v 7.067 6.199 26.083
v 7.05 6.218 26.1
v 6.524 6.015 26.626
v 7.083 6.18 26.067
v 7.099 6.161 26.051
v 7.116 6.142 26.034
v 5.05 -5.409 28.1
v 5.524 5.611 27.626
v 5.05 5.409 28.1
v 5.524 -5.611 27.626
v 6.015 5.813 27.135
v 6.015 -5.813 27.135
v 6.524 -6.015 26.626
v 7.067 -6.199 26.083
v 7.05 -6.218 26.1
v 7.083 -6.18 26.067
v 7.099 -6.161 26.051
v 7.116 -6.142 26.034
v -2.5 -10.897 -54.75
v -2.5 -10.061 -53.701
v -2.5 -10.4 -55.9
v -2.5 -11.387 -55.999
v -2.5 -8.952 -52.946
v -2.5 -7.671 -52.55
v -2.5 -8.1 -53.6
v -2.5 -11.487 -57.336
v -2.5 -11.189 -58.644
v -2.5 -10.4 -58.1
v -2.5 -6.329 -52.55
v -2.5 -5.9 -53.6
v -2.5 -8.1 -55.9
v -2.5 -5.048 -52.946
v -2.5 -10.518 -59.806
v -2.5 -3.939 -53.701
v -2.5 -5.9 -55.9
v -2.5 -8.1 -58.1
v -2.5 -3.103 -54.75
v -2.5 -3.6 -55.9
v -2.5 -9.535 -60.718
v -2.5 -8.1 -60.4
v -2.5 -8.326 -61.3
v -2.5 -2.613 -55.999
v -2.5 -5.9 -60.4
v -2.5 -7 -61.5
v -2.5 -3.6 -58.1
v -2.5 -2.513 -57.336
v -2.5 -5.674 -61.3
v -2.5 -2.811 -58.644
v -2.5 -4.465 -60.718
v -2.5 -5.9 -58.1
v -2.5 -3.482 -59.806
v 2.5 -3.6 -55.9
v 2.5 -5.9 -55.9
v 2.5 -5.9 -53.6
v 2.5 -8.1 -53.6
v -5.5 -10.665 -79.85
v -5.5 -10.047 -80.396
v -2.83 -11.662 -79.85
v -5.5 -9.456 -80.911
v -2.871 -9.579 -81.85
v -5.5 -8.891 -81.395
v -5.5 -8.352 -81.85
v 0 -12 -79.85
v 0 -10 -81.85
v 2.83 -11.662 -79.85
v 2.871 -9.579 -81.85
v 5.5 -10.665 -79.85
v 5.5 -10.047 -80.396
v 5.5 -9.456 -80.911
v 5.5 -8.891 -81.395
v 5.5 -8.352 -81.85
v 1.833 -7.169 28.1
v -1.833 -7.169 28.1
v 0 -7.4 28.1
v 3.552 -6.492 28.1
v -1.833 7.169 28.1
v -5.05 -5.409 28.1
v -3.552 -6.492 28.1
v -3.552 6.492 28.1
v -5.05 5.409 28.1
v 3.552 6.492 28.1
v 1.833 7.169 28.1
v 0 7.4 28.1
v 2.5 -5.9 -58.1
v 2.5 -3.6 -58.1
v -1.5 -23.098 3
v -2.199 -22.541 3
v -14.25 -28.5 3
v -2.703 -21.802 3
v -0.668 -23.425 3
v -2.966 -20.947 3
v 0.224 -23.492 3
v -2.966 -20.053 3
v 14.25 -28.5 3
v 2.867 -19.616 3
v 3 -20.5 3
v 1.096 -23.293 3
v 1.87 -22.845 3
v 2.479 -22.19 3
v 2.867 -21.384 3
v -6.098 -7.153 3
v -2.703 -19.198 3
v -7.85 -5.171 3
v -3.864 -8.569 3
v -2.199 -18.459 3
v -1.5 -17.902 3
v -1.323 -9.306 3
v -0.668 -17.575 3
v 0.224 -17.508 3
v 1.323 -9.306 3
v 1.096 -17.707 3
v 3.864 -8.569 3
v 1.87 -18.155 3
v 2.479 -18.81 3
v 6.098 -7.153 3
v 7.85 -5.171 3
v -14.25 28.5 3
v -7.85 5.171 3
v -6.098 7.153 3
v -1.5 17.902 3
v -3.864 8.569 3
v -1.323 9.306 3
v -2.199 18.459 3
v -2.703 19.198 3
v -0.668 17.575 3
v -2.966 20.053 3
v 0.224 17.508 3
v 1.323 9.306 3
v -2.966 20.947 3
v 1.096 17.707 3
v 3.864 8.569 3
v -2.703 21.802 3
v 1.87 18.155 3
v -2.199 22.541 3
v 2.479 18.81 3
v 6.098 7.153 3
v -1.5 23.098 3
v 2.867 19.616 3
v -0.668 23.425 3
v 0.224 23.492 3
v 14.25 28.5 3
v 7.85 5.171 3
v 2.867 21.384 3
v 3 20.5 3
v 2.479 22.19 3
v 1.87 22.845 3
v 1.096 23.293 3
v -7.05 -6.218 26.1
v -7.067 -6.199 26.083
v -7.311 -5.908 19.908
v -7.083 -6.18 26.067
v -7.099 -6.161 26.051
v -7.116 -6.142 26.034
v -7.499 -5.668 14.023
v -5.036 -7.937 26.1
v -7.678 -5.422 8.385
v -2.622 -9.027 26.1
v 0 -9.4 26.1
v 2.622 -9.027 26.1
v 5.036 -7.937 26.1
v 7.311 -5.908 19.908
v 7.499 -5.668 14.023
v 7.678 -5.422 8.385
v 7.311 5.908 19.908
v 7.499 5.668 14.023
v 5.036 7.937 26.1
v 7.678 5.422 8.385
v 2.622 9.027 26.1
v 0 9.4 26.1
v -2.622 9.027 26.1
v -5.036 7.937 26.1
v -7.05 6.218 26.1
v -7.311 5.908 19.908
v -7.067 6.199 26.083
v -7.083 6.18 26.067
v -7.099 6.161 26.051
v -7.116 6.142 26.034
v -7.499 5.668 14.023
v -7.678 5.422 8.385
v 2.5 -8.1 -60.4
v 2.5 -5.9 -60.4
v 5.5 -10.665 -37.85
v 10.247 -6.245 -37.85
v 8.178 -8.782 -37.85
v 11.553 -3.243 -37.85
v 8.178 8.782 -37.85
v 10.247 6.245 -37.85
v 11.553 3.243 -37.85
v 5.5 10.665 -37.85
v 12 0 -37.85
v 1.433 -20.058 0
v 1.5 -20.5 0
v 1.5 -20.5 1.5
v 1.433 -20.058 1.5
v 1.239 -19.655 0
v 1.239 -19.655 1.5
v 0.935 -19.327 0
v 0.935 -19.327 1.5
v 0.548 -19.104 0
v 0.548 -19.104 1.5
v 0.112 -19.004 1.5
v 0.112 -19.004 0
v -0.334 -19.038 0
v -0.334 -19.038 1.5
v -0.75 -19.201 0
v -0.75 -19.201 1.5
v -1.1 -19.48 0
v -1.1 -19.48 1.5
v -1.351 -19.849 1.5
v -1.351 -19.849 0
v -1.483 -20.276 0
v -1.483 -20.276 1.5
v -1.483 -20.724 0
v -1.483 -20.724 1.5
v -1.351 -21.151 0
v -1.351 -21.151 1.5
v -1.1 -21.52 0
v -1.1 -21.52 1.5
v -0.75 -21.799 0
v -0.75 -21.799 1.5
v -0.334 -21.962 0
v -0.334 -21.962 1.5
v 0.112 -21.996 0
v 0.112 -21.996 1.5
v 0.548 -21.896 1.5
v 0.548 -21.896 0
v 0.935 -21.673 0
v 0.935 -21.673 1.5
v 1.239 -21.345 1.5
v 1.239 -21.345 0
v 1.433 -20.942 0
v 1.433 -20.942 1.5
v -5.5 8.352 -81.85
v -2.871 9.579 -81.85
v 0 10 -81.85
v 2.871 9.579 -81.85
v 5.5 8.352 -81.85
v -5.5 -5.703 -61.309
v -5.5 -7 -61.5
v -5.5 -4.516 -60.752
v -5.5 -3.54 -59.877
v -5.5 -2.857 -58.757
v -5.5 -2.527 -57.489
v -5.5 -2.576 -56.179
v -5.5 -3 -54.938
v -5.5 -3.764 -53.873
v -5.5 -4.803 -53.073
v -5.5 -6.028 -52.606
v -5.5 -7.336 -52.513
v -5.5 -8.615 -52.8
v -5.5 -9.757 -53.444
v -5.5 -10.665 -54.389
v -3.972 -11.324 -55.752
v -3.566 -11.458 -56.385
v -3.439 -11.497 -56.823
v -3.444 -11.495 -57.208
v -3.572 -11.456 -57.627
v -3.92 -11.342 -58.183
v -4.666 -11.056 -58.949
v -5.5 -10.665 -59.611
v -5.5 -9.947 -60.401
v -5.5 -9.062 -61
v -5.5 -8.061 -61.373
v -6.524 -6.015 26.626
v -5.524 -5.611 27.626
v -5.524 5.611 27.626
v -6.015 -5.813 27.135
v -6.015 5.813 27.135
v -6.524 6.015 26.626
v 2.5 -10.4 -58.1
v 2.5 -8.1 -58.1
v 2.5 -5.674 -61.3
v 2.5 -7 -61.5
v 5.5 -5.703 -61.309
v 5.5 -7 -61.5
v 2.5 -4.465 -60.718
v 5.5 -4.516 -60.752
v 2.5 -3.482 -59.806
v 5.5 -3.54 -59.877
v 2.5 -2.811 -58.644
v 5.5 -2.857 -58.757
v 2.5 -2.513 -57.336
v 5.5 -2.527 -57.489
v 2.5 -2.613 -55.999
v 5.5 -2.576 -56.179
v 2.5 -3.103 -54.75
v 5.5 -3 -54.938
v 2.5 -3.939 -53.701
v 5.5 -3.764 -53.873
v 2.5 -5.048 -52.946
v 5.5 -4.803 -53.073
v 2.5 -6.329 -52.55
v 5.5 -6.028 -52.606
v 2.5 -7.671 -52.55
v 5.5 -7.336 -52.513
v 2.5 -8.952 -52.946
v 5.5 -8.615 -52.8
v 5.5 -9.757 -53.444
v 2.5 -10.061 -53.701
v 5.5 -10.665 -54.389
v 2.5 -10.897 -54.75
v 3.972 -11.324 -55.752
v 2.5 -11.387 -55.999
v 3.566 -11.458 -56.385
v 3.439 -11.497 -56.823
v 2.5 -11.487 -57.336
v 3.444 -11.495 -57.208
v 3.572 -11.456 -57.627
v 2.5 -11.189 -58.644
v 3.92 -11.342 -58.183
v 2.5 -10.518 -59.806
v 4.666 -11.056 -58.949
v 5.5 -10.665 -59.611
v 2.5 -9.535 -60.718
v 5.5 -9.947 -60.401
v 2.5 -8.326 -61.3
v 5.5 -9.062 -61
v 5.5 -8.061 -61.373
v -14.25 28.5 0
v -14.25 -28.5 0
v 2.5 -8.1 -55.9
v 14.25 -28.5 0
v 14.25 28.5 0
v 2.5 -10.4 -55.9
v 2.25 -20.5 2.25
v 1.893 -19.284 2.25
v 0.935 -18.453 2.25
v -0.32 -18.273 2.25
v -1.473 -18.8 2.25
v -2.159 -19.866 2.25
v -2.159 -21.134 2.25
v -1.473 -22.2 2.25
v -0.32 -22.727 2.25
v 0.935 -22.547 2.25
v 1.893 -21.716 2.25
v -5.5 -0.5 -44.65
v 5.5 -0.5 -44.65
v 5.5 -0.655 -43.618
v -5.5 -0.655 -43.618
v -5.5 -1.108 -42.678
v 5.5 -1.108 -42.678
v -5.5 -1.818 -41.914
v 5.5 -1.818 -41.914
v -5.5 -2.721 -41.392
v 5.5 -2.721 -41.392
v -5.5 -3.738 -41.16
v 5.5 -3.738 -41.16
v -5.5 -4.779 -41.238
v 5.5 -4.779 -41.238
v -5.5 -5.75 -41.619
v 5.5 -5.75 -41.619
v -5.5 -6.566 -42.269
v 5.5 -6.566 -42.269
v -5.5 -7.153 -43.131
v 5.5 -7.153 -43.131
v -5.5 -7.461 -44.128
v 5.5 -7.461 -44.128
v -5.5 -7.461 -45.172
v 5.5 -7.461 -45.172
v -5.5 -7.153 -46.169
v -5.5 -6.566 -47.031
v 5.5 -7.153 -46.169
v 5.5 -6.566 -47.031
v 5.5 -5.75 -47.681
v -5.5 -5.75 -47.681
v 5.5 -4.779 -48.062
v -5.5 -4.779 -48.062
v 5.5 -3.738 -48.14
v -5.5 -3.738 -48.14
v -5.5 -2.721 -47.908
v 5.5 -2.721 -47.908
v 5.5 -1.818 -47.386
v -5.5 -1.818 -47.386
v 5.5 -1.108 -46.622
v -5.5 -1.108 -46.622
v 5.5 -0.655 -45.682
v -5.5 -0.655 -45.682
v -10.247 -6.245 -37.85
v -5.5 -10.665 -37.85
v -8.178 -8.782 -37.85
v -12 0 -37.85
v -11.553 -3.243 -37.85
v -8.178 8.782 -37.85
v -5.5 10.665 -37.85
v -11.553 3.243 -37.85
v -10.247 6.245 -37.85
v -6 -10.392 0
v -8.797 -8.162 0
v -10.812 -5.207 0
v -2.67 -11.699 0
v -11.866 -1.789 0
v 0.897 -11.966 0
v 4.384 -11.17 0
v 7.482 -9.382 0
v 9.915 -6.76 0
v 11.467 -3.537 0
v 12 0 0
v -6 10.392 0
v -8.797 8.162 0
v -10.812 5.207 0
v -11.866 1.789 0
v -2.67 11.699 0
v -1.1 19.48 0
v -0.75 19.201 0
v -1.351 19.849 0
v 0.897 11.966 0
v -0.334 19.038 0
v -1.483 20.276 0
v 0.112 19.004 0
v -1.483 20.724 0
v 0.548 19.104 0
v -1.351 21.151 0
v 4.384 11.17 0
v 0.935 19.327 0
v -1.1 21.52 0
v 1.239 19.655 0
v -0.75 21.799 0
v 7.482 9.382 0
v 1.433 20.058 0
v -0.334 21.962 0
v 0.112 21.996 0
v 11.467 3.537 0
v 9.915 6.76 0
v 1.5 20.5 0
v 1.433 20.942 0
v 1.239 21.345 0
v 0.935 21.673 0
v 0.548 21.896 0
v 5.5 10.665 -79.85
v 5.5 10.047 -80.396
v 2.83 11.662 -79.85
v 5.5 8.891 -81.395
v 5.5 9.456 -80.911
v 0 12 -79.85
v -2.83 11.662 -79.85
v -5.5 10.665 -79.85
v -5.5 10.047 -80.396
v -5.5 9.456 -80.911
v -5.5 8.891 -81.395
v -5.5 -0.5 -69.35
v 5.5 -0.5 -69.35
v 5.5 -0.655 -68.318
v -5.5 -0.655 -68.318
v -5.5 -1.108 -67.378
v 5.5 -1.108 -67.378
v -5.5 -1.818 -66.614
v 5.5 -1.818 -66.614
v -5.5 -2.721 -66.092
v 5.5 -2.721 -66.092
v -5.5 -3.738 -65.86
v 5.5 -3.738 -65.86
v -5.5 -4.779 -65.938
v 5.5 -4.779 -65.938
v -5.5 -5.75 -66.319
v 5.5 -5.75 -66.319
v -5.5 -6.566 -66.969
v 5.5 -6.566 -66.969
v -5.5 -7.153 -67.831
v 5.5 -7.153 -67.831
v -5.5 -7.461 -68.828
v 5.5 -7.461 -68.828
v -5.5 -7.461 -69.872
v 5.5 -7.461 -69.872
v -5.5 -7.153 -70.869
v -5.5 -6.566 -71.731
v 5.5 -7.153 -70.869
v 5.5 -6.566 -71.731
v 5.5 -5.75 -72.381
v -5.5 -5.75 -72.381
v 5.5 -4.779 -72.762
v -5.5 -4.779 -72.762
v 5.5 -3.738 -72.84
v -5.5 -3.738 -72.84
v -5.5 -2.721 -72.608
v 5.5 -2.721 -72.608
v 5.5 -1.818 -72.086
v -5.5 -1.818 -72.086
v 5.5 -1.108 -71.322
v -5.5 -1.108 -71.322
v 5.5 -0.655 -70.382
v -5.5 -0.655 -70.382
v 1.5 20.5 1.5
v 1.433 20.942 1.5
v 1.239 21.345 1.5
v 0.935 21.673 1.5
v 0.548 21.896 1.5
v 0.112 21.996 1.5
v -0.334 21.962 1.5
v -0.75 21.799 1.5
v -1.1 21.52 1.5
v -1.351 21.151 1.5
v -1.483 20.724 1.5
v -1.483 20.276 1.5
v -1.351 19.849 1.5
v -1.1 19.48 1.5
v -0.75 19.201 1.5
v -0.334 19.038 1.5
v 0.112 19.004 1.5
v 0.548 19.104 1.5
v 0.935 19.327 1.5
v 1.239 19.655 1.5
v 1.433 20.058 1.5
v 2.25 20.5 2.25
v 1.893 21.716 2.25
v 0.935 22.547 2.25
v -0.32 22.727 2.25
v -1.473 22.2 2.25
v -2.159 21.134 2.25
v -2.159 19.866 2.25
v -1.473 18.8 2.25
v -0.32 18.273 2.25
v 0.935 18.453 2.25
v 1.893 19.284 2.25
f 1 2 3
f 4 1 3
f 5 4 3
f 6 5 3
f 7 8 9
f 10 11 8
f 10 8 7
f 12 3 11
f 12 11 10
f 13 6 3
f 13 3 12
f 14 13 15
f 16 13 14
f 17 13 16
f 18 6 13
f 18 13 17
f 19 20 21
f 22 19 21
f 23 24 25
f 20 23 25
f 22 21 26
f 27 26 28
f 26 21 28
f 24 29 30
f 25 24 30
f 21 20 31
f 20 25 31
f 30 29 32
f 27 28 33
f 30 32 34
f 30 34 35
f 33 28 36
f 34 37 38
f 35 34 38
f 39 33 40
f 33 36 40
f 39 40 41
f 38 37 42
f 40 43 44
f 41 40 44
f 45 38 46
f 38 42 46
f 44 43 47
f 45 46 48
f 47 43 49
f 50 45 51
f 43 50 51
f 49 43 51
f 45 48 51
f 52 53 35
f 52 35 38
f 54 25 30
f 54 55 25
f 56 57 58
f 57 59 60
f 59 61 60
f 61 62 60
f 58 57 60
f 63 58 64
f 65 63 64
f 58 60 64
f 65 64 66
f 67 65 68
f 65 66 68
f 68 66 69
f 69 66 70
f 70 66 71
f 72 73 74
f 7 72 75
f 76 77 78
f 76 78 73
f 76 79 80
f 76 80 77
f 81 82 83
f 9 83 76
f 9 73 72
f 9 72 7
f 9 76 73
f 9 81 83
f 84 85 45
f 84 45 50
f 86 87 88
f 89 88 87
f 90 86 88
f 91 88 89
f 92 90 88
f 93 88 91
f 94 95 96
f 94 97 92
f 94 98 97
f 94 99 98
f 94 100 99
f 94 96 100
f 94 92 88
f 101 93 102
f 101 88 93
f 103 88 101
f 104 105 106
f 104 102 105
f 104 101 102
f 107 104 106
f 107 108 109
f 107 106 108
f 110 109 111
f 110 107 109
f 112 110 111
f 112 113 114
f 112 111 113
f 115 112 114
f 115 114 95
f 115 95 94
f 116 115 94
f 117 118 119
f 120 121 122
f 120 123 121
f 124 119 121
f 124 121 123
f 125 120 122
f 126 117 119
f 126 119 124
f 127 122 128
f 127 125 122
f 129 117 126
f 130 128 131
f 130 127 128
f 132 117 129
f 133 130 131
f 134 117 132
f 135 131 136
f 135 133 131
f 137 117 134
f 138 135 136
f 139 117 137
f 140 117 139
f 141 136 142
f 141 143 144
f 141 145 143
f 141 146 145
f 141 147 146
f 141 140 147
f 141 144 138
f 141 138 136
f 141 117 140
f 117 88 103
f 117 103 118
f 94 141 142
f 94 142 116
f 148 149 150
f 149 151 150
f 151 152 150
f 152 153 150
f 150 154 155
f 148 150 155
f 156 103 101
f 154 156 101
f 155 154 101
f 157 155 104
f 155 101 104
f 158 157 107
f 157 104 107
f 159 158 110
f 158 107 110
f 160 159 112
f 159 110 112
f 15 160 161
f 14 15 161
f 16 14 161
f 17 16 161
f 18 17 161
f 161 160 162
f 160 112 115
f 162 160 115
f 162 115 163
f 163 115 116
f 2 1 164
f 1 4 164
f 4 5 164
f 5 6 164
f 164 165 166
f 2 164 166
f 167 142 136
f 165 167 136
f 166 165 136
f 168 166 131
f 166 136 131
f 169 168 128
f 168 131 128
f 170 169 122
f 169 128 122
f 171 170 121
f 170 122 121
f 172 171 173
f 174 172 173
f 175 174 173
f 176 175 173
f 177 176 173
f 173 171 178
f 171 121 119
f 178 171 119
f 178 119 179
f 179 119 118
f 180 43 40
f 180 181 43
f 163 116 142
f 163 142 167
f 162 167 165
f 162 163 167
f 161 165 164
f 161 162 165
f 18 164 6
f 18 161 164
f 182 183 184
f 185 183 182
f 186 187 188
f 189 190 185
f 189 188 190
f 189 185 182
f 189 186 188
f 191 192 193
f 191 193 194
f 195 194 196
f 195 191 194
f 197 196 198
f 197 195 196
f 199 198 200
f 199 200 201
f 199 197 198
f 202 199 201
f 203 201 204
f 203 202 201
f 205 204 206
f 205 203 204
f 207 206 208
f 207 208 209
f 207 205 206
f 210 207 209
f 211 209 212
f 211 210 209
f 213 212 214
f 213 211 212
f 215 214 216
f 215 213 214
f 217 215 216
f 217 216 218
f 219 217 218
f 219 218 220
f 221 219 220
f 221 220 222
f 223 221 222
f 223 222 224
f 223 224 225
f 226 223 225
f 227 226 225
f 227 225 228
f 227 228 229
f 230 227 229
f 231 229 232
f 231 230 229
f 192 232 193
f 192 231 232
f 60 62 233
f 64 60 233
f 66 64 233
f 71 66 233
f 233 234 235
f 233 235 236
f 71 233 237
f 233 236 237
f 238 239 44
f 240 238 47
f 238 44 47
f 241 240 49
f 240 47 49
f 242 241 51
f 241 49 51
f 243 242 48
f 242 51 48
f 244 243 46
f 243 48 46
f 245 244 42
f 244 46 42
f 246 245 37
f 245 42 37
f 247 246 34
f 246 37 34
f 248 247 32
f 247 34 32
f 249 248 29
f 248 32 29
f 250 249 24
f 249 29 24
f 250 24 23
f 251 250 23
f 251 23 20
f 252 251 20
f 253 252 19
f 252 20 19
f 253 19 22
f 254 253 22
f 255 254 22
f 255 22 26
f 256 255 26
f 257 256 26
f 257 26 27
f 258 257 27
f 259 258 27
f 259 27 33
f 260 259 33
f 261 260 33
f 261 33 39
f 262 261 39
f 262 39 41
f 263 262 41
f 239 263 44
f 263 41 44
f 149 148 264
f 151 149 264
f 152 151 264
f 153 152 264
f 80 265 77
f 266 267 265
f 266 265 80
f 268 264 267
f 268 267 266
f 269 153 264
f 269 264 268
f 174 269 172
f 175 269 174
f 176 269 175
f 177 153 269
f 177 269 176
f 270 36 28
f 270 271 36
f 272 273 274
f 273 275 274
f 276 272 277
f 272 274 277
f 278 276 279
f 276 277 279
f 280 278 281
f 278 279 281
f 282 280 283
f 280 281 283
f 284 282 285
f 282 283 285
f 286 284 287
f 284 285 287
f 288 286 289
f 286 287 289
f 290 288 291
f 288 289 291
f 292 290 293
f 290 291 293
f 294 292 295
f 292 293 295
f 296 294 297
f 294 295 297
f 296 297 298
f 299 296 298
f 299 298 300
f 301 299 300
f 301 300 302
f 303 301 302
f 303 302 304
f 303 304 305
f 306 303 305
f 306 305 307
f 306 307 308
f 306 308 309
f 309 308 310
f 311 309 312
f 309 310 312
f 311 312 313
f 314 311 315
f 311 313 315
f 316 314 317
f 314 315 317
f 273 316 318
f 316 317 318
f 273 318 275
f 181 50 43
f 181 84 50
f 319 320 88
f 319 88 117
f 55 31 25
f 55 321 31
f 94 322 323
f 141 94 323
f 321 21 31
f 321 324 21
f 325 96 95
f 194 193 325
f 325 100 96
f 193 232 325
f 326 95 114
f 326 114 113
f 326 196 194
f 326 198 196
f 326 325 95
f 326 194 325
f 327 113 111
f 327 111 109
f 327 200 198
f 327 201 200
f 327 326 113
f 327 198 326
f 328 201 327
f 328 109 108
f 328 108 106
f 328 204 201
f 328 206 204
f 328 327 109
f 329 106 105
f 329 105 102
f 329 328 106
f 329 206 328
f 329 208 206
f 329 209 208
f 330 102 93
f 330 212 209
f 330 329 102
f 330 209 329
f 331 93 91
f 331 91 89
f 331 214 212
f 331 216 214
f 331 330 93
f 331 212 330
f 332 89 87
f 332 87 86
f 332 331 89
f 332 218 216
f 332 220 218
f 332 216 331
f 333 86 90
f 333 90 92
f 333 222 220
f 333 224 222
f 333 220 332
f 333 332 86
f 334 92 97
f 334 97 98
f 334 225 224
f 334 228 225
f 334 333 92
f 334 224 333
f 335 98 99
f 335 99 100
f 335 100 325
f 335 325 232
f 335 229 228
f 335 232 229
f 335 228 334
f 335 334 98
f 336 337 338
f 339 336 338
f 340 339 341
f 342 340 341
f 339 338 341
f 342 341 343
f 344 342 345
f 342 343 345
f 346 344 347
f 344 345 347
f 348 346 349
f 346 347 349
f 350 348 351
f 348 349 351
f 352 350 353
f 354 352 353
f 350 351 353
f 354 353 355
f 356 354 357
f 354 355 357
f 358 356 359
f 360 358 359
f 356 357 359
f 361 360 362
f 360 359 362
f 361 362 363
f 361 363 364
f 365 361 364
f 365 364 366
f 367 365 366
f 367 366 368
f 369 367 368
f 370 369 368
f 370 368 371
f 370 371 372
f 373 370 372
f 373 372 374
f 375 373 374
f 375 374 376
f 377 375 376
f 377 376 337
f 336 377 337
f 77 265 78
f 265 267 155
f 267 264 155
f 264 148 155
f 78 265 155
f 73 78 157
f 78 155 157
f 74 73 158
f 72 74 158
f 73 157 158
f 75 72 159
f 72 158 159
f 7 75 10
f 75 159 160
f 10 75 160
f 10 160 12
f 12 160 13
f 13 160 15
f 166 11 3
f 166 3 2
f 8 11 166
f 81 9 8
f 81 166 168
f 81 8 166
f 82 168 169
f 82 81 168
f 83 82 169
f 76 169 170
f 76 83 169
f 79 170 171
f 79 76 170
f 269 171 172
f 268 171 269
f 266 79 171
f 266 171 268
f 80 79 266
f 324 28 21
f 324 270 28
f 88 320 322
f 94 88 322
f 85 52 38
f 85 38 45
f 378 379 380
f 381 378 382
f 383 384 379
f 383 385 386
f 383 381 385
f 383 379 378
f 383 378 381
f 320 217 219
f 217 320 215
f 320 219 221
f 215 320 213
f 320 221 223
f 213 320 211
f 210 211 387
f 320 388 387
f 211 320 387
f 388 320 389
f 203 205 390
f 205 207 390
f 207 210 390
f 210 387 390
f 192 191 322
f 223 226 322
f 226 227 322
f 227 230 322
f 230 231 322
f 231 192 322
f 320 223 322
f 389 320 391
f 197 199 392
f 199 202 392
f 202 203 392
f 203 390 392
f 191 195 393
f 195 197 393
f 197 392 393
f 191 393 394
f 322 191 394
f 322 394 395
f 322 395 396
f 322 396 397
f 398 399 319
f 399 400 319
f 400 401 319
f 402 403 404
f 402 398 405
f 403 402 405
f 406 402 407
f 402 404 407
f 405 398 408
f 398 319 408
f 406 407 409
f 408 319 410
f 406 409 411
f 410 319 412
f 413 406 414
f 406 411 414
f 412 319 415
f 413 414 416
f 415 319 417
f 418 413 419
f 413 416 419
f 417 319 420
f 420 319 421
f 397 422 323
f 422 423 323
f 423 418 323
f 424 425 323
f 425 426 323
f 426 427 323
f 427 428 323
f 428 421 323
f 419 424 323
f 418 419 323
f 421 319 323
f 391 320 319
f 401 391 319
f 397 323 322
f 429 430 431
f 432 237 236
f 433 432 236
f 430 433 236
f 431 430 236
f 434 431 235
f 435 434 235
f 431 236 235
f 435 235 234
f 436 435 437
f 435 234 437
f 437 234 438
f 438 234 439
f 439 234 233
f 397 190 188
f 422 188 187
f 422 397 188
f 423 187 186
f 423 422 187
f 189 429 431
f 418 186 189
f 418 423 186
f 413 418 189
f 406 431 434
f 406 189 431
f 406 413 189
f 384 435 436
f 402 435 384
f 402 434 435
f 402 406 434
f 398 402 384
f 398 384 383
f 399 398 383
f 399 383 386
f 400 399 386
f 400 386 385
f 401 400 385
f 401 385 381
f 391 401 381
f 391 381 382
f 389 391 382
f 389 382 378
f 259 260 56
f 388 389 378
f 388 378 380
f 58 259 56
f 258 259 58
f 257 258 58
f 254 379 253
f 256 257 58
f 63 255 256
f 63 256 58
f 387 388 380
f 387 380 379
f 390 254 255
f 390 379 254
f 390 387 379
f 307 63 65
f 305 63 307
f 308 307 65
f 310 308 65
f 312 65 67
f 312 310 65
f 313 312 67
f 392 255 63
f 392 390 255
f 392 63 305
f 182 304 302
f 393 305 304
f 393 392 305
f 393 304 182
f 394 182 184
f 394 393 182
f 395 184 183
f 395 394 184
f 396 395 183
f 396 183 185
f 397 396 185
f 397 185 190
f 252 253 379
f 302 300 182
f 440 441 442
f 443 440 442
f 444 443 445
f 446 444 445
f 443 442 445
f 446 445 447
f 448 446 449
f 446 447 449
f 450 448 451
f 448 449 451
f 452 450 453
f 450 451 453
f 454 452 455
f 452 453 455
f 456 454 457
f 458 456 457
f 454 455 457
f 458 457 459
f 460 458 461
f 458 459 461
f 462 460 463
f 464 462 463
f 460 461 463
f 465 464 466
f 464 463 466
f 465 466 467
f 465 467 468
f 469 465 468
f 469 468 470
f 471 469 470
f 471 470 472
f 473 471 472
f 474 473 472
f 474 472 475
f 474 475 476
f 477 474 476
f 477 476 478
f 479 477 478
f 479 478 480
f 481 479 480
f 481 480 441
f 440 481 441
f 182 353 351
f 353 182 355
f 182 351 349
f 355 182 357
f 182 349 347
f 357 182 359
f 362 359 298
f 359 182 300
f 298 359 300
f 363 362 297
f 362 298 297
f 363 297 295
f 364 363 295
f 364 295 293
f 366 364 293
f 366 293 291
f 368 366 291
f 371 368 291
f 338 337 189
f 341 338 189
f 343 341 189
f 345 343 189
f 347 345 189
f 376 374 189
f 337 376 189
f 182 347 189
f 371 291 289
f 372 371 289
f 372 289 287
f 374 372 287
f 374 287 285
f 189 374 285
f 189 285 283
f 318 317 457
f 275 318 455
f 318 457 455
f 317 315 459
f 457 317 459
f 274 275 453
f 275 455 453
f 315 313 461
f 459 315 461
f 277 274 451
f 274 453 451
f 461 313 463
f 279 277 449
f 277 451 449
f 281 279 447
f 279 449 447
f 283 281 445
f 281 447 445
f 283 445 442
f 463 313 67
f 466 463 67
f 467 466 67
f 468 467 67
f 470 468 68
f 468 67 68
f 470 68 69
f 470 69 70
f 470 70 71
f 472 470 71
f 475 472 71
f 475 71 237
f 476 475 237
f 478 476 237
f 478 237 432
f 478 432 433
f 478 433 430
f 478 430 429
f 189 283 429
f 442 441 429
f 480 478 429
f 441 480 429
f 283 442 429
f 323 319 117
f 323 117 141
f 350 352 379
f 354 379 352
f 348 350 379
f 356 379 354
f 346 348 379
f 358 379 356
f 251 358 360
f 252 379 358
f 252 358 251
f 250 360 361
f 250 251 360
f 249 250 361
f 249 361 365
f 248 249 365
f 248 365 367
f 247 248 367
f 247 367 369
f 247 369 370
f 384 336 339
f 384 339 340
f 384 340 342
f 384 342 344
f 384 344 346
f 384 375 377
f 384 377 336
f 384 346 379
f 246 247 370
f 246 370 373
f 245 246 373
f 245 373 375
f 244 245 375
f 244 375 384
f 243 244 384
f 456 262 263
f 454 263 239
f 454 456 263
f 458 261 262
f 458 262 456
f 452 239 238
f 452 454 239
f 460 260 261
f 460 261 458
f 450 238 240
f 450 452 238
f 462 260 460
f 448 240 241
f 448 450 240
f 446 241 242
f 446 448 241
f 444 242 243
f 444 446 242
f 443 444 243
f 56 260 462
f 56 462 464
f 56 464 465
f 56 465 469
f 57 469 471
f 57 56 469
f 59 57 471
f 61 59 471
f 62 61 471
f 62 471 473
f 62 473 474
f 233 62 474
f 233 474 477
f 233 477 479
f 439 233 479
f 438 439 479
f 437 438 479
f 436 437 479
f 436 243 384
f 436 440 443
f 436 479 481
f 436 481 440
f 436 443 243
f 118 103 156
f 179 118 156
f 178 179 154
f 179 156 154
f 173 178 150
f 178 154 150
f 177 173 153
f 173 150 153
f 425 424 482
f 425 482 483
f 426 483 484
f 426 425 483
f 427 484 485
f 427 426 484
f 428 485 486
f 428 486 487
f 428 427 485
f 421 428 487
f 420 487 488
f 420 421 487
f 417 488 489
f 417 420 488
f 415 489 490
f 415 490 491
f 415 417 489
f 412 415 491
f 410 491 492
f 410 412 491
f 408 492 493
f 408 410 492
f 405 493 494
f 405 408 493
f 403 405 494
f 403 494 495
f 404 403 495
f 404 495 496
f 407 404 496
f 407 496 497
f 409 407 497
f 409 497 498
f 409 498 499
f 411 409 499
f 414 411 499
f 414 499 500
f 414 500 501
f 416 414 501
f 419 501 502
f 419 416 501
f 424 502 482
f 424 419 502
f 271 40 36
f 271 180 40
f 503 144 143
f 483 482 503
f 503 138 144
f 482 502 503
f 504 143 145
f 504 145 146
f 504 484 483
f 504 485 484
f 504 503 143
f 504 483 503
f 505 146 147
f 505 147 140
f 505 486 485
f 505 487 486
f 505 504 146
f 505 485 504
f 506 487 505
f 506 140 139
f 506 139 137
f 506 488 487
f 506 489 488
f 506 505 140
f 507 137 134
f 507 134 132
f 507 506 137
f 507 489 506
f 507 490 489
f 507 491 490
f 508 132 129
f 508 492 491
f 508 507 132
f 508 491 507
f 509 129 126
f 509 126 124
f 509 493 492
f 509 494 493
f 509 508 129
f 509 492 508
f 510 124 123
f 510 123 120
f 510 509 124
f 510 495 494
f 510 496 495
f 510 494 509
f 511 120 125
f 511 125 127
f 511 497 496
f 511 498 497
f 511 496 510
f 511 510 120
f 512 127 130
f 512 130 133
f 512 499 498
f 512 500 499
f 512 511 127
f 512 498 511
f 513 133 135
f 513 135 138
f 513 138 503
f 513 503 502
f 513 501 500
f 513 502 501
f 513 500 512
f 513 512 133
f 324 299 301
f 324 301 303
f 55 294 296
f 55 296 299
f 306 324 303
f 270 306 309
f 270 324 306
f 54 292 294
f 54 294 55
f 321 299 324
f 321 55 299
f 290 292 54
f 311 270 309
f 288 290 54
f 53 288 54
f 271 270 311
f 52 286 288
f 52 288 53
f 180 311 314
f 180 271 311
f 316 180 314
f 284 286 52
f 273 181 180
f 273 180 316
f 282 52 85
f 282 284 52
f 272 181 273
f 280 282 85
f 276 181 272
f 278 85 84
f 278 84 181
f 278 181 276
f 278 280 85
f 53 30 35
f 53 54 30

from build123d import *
from OCP.BRepFilletAPI import BRepFilletAPI_MakeChamfer

# Parameters (mm, degrees)
SKETCH2_R                = 12
BOSS_EXTRUDE1_DEPTH      = 81.85
SKETCH3_W                = 28.5
SKETCH3_H                = 57
SKETCH3_R                = 1.5
BOSS_EXTRUDE2_DEPTH      = 3
CHAMFER1_SIZE            = 1.5
SKETCH4_R                = 9.4
BOSS_EXTRUDE3_DEPTH      = 25.1
CUT_EXTRUDE1_DEPTH       = 88.8335642
CUT_EXTRUDE1_DEPTH_BACK  = 88.8335642
CHAMFER2_SIZE            = 2
CHAMFER2_SIZE2           = 2.066892656
CHAMFER3_SIZE            = 2
SKETCH6_R                = 4.5
CUT_EXTRUDE2_DEPTH       = 88.8335642
CUT_EXTRUDE2_DEPTH_BACK  = 88.8335642
SKETCH7_W                = 35.652875986
SKETCH7_H                = 43.298184849
SKETCH7_W_2              = 11
SKETCH7_H_2              = 30
CUT_EXTRUDE3_DEPTH       = 44
SKETCH8_R                = 4.5
BOSS_EXTRUDE4_DEPTH      = 2.5
BOSS_EXTRUDE4_DEPTH_BACK = 2.5
SKETCH9_R                = 3.5
CUT_EXTRUDE4_DEPTH       = 89.891703775


with BuildPart() as part:
    # Sketch2 → Boss-Extrude1 (new body)
    with BuildSketch(Plane.XY):
        Circle(SKETCH2_R)
    extrude(amount=-BOSS_EXTRUDE1_DEPTH)

    # Sketch3 → Boss-Extrude2 (add)
    with BuildSketch(Plane.XY):
        Rectangle(SKETCH3_W, SKETCH3_H)
        with Locations((0, 20.5)):
            Circle(SKETCH3_R, mode=Mode.SUBTRACT)
        with Locations((0, -20.5)):
            Circle(SKETCH3_R, mode=Mode.SUBTRACT)
    extrude(amount=BOSS_EXTRUDE2_DEPTH)

    # Chamfer1
    chamfer1_edges = [part.edges().sort_by_distance(p)[0] for p in [
        (-1.5, 20.5, 3),
        (-1.5, -20.5, 3),
    ]]
    chamfer(chamfer1_edges, length=CHAMFER1_SIZE)

    # Sketch4 → Boss-Extrude3 (add)
    with BuildSketch(Plane.XY.offset(3)):
        Circle(SKETCH4_R)
    extrude(amount=BOSS_EXTRUDE3_DEPTH)

    # Sketch5 → Cut-Extrude1 (cut, two sides)
    with BuildSketch(Plane(origin=(0, 0, 0), x_dir=(1, 0, 0), z_dir=(0, 1, 0))) as cut_extrude1_sk:
        Polygon((-7.85, -3), (-7.05, -28.1), (-9.4, -28.1), (-9.4, -3), align=None)
        Polygon((9.4, -3), (7.85, -3), (7.05, -28.1), (9.4, -28.1), align=None)
    extrude(amount=CUT_EXTRUDE1_DEPTH, mode=Mode.SUBTRACT)
    extrude(cut_extrude1_sk.sketch, amount=-CUT_EXTRUDE1_DEPTH_BACK, mode=Mode.SUBTRACT)

    # Chamfer2: one chamfer whose edges measure the first distance from different faces: ONE call of the kernel's chamfer builder (chamfer() names one face for all edges)
    chamfer2_edges_1 = [part.edges().sort_by_distance(p)[0] for p in [
        (0, -9.4, 28.1),
        (0, 9.4, 28.1),
    ]]
    chamfer2_edges_2 = [part.edges().sort_by_distance(p)[0] for p in [
        (7.05, 0, 28.1),
        (-7.05, 0, 28.1),
    ]]
    chamfer2_side_2 = [part.faces().sort_by_distance(p)[0] for p in [
        (0, 0, 28.1),
    ]]
    chamfer2 = BRepFilletAPI_MakeChamfer(part.part.solid().wrapped)
    for e in chamfer2_edges_1:
        chamfer2.Add(CHAMFER2_SIZE, e.wrapped)
    for e in chamfer2_edges_2:
        chamfer2.Add(CHAMFER2_SIZE, CHAMFER2_SIZE2, e.wrapped, chamfer2_side_2[0].wrapped)  # the first distance lies on this face
    add(Compound.cast(chamfer2.Shape()), mode=Mode.REPLACE)

    # Chamfer3
    chamfer3_edges = [part.edges().sort_by_distance(p)[0] for p in [
        (-12, 0, -81.85),
    ]]
    chamfer(chamfer3_edges, length=CHAMFER3_SIZE)

    # Sketch6 → Cut-Extrude2 (cut, two sides)
    with BuildSketch(Plane(origin=(0, 0, 0), x_dir=(0, 0, -1), z_dir=(1, 0, 0))) as cut_extrude2_sk:
        with Locations((57, -7)):
            Circle(SKETCH6_R)
    extrude(amount=CUT_EXTRUDE2_DEPTH, mode=Mode.SUBTRACT)
    extrude(cut_extrude2_sk.sketch, amount=-CUT_EXTRUDE2_DEPTH_BACK, mode=Mode.SUBTRACT)

    # Sketch7 → Cut-Extrude3 (cut)
    with BuildSketch(Plane(origin=(0, 0, -81.85), x_dir=(-1, 0, 0), z_dir=(0, 0, -1))):
        with Locations((0.794809337, 0.340632573)):
            Rectangle(SKETCH7_W, SKETCH7_H)
        Rectangle(SKETCH7_W_2, SKETCH7_H_2, mode=Mode.SUBTRACT)
    extrude(amount=-CUT_EXTRUDE3_DEPTH, mode=Mode.SUBTRACT)

    # Sketch8 → Boss-Extrude4 (add, two sides)
    with BuildSketch(Plane(origin=(0, 0, 0), x_dir=(0, 0, -1), z_dir=(1, 0, 0))) as boss_extrude4_sk:
        with Locations((57, -7)):
            Circle(SKETCH8_R)
        Polygon((55.9, -5.9), (55.9, -3.6), (58.1, -3.6), (58.1, -5.9), (60.4, -5.9), (60.4, -8.1), (58.1, -8.1), (58.1, -10.4), (55.9, -10.4), (55.9, -8.1), (53.6, -8.1), (53.6, -5.9), align=None, mode=Mode.SUBTRACT)
    extrude(amount=BOSS_EXTRUDE4_DEPTH)
    extrude(boss_extrude4_sk.sketch, amount=-BOSS_EXTRUDE4_DEPTH_BACK)

    # Sketch9 → Cut-Extrude4 (cut, through all)
    with BuildSketch(Plane(origin=(5.5, 0, 0), x_dir=(0, 0, -1), z_dir=(1, 0, 0))):
        with Locations(Location((44.65, -4, 0), (0, 0, 90))):
            Circle(SKETCH9_R)
        with Locations(Location((69.35, -4, 0), (0, 0, 90))):
            Circle(SKETCH9_R)
    extrude(amount=-CUT_EXTRUDE4_DEPTH, mode=Mode.SUBTRACT)


solid = part.part
